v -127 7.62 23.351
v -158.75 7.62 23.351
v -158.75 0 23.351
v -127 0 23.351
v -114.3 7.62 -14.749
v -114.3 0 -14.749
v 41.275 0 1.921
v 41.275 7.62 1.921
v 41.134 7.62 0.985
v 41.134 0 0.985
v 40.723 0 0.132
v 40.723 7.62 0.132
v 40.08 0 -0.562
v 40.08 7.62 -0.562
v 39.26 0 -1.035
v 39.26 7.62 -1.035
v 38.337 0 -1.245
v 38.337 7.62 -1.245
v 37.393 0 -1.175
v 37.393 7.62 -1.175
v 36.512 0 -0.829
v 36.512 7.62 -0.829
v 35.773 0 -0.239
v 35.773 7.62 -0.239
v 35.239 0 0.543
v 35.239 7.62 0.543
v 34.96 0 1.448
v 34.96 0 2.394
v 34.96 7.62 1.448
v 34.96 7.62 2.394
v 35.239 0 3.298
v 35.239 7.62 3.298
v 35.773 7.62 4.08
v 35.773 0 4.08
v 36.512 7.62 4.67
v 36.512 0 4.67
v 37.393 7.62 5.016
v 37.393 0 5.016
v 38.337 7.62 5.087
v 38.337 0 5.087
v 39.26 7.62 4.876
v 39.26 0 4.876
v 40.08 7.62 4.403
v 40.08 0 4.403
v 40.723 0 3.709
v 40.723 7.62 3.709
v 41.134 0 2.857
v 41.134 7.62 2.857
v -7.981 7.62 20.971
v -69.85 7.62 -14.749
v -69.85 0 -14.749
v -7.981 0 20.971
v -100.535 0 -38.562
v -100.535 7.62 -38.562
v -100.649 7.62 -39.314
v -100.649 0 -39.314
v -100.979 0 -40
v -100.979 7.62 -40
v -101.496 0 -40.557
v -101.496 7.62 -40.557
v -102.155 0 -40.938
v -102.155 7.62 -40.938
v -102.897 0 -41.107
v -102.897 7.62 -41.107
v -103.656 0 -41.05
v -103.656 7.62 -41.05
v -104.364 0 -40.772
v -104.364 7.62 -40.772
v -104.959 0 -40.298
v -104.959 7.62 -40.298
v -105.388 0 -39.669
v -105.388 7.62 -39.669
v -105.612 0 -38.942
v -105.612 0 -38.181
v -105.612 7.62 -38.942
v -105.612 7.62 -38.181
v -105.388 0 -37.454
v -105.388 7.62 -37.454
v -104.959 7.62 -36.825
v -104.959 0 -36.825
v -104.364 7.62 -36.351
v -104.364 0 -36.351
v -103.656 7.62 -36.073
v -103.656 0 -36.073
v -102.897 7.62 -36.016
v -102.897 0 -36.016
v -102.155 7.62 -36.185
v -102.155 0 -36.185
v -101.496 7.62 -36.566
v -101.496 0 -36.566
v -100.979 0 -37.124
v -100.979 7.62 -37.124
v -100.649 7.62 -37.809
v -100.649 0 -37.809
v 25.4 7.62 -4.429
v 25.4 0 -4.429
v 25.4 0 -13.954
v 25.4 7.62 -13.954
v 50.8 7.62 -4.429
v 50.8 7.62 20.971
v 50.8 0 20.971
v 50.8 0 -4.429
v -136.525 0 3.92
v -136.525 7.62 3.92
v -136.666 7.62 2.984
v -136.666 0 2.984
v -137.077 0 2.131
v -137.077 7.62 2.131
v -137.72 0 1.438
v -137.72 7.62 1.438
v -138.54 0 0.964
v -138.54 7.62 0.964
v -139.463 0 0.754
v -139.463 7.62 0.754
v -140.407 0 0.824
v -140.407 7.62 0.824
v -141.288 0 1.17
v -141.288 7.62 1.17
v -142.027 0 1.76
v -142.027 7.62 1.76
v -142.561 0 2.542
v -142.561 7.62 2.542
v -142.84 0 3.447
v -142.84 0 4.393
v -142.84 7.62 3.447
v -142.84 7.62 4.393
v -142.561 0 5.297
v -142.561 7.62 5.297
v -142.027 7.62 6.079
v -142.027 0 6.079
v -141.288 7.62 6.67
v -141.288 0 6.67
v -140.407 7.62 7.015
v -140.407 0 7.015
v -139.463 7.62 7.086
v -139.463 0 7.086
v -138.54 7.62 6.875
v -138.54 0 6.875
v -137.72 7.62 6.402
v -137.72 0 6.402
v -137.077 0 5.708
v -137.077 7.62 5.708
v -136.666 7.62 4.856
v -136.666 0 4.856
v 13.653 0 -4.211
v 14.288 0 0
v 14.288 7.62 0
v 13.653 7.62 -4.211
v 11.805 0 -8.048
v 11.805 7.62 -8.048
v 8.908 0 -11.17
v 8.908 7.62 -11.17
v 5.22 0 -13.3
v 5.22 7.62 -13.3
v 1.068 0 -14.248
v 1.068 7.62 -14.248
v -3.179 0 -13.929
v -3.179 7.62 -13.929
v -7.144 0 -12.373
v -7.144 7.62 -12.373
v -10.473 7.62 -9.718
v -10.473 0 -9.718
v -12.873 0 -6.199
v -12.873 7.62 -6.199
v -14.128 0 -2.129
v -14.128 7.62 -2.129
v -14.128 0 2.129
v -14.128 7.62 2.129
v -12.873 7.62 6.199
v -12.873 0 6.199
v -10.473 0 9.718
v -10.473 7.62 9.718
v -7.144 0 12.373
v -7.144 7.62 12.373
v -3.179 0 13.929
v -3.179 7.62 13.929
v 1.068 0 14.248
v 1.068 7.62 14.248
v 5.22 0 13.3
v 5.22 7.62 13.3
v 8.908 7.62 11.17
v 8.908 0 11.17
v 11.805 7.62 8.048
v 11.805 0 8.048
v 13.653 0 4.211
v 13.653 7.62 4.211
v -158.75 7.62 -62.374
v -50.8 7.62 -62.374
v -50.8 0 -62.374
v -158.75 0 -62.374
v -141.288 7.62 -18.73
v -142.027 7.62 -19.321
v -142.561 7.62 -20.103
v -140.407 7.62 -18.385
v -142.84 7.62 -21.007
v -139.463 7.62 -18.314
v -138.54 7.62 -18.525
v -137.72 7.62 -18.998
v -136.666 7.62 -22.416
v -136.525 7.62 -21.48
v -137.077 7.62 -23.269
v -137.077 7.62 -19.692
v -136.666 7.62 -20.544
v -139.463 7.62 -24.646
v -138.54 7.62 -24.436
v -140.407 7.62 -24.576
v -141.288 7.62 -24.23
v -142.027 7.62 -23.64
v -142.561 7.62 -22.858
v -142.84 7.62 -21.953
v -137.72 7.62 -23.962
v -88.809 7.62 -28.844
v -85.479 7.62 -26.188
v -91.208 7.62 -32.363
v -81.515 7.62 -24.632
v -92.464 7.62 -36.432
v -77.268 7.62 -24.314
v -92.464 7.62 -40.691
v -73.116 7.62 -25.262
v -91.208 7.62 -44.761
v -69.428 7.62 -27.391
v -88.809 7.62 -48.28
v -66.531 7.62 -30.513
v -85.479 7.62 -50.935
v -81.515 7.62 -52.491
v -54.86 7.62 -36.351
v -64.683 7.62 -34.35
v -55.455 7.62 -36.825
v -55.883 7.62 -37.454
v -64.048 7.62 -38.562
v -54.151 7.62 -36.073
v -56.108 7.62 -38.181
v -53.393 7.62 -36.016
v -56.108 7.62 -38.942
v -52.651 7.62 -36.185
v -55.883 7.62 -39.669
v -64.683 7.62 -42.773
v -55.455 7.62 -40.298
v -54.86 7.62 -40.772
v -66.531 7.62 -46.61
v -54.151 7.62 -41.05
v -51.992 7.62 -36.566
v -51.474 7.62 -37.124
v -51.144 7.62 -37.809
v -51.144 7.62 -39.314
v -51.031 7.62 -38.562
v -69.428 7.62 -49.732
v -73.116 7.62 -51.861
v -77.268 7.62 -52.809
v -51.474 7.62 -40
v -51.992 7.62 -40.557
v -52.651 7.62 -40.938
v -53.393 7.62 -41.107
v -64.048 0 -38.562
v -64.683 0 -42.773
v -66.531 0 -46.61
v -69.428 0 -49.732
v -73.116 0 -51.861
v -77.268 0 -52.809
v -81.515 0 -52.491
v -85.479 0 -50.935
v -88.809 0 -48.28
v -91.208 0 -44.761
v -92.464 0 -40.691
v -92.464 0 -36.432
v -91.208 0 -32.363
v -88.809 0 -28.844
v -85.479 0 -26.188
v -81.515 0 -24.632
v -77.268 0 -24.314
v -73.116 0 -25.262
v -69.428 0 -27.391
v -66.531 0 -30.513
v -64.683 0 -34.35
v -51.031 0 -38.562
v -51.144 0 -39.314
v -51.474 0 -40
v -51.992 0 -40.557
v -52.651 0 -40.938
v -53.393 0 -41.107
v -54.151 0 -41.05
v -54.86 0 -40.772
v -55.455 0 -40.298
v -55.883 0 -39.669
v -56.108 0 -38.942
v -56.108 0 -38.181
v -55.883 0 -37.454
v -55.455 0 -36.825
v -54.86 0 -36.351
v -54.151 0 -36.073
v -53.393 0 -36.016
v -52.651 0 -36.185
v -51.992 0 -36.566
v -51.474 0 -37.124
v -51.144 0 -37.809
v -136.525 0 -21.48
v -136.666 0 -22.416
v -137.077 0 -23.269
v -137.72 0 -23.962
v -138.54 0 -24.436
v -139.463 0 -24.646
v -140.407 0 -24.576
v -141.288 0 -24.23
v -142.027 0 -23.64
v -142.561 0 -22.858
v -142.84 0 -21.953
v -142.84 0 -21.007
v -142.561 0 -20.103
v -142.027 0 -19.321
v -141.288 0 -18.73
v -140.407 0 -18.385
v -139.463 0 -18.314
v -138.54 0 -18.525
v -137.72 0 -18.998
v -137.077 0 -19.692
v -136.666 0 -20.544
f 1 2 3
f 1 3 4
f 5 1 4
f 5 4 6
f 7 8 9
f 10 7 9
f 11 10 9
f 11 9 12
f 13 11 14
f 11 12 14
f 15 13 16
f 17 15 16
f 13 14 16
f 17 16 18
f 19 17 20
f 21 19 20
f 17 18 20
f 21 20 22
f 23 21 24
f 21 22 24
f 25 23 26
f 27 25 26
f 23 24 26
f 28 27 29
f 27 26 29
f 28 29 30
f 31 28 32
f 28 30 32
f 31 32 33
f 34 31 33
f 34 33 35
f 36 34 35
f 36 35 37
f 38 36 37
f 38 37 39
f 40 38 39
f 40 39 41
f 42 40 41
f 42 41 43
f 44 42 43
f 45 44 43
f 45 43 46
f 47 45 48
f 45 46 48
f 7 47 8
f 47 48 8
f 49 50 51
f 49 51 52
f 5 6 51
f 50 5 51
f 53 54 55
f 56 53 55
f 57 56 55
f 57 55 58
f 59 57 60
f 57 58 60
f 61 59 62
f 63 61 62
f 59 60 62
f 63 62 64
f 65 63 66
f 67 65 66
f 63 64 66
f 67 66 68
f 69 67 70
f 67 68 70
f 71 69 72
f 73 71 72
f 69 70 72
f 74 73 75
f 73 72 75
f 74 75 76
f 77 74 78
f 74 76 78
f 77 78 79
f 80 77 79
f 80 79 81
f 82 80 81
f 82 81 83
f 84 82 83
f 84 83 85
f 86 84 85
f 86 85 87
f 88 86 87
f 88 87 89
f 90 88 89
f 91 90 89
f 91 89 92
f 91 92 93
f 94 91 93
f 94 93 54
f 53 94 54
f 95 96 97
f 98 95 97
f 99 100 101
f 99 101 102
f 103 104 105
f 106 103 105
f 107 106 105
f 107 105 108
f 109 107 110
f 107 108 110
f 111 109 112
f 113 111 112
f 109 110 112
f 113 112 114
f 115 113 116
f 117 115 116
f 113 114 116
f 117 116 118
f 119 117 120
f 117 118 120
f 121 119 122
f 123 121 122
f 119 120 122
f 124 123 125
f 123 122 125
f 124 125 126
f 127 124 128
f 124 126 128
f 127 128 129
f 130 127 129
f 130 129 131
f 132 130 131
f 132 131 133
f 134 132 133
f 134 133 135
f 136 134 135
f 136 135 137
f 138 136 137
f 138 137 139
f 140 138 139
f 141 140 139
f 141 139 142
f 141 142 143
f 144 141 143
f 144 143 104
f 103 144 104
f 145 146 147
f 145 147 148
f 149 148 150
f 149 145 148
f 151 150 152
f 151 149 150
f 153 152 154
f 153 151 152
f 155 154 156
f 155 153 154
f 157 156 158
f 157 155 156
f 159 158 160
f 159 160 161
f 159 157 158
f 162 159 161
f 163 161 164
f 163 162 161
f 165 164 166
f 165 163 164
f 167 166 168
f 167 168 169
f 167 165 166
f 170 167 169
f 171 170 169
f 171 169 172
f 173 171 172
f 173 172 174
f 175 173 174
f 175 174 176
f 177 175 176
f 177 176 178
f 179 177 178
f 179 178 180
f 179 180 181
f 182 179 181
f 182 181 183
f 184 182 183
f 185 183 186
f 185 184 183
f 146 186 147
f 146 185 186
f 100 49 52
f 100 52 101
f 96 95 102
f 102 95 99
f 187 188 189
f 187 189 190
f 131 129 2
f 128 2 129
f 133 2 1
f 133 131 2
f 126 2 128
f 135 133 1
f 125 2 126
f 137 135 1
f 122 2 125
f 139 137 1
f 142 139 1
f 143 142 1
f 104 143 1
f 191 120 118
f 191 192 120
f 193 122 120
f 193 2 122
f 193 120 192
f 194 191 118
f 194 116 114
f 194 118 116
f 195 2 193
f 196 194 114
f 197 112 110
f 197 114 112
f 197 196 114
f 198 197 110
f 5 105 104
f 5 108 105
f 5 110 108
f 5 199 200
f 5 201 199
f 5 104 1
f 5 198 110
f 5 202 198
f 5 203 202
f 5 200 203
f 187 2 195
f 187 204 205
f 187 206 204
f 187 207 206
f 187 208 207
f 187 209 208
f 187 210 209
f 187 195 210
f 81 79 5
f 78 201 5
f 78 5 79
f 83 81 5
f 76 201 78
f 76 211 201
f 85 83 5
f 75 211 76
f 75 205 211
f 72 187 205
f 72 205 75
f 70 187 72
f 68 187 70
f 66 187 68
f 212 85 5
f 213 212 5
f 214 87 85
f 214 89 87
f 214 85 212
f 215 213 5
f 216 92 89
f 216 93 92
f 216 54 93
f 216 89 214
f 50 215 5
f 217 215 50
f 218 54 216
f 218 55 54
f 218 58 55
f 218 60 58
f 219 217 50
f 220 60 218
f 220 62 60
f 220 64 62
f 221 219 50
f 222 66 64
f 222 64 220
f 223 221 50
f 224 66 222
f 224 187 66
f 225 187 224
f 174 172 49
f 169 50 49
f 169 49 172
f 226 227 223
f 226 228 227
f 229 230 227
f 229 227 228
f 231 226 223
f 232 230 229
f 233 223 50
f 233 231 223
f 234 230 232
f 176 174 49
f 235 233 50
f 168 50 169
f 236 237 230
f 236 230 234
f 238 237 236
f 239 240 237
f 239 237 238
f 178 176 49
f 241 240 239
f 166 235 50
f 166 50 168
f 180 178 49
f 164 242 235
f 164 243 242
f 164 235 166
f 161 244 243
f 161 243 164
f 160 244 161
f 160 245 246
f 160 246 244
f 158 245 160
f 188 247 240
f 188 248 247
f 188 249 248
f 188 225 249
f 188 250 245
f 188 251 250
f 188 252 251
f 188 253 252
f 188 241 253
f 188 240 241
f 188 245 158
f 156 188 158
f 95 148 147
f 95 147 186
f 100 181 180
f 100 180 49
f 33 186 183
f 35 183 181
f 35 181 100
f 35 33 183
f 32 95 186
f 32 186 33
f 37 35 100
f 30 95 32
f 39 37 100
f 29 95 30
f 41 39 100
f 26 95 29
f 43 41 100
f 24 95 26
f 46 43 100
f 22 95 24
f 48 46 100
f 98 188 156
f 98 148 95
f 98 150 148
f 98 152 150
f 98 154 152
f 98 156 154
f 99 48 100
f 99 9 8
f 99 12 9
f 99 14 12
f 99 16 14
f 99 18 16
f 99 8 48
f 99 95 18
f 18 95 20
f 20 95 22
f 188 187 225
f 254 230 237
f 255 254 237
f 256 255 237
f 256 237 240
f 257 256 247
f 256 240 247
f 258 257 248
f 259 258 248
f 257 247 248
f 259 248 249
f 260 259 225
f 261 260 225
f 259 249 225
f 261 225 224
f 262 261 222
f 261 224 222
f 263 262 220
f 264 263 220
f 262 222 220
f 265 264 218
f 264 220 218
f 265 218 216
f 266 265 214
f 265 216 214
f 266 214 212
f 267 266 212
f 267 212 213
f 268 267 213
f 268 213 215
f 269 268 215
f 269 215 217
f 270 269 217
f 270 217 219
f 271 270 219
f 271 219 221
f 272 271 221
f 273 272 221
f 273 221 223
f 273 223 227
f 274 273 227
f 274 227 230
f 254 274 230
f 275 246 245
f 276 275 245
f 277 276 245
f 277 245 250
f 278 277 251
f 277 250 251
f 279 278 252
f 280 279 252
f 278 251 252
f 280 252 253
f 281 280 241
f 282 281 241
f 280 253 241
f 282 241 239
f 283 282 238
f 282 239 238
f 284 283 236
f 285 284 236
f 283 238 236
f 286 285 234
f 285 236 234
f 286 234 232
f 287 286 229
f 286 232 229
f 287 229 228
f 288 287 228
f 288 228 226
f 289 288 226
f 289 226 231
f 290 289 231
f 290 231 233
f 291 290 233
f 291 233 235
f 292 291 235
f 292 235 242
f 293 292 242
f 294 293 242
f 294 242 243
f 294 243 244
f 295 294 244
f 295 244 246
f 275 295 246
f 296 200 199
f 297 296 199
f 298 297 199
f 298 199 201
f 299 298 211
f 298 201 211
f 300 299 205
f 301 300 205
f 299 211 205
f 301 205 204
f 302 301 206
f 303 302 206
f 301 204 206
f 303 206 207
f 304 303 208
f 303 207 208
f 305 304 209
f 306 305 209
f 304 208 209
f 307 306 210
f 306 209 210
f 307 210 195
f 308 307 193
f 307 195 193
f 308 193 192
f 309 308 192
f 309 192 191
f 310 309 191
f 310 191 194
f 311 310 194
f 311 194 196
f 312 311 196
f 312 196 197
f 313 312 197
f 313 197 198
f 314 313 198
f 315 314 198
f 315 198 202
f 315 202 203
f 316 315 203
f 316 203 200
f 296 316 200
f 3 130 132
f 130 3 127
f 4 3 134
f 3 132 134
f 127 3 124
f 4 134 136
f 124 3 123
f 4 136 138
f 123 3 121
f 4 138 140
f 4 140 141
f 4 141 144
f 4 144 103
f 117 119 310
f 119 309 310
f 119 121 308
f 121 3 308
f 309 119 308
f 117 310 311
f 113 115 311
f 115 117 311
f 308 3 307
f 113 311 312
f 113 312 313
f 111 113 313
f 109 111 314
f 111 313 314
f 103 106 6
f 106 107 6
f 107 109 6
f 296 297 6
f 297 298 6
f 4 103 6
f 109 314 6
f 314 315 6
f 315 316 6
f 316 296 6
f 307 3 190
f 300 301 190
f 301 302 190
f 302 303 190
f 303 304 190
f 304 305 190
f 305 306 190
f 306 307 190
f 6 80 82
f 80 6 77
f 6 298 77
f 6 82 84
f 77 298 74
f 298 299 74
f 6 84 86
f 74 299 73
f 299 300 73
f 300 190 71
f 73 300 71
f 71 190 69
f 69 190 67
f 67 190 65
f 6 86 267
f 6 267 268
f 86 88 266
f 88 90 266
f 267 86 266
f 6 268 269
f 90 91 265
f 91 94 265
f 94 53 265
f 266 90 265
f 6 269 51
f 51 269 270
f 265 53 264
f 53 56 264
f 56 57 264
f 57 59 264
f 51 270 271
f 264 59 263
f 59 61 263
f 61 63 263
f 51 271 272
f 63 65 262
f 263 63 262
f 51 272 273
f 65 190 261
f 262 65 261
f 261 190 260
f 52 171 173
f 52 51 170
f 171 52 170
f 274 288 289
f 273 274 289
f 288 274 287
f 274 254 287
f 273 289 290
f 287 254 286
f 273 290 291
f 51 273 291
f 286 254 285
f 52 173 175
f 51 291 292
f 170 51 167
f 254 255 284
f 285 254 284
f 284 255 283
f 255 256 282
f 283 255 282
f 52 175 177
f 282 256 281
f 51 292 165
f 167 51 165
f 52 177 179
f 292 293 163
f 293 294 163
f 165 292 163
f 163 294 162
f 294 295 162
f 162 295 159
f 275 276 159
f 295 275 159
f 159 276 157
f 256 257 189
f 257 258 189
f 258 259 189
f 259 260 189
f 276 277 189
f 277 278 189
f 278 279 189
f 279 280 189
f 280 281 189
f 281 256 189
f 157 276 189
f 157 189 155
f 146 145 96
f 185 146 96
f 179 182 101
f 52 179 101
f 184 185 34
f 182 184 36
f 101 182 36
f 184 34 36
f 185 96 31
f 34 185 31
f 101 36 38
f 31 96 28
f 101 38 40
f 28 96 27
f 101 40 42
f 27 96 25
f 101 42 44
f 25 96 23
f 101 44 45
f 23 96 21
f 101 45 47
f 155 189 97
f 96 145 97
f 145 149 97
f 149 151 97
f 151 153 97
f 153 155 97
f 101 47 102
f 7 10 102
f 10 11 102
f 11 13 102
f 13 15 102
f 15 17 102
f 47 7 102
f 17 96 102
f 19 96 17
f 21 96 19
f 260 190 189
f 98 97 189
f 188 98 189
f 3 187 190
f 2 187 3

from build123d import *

# Parameters (mm, degrees)
SKETCH1_R           = 14.2875
BOSS_EXTRUDE1_DEPTH = 7.62
SKETCH2_R           = 14.2875
SKETCH2_R_2         = 2.5527
CUT_EXTRUDE1_DEPTH  = 8.62
SKETCH5_W           = 25.4
SKETCH5_H           = 25.4
SKETCH5_R           = 3.175
BOSS_EXTRUDE3_DEPTH = 7.62
BOSS_EXTRUDE4_DEPTH = 7.62
SKETCH7_R           = 3.175
CUT_EXTRUDE2_DEPTH  = 8.62
CUT_EXTRUDE3_DEPTH  = 7.62


with BuildPart() as part:
    # Sketch1 → Boss-Extrude1 (new body)
    with BuildSketch(Plane(origin=(0, 0, 0), x_dir=(1, 0, 0), z_dir=(0, 1, 0))):
        Polygon((-76.2, 14.749121283), (-14.331263069, -20.970810639), (25.4, -20.970810639), (25.4, 13.954189361), (-50.8, 62.374121283), (-152.4, 62.374121283), (-152.4, 14.749121283), align=None)
        Circle(SKETCH1_R, mode=Mode.SUBTRACT)
    extrude(amount=BOSS_EXTRUDE1_DEPTH)

    # Sketch2 → Cut-Extrude1 (cut, through all)
    with BuildSketch(Plane(origin=(0, 7.62, 0), x_dir=(1, 0, 0), z_dir=(0, 1, 0))):
        with Locations((-78.335649741, 38.561621283)):
            Circle(SKETCH2_R)
        with Locations((-103.087949741, 38.561621283)):
            Circle(SKETCH2_R_2)
        with Locations((-53.583349741, 38.561621283)):
            Circle(SKETCH2_R_2)
    extrude(amount=-CUT_EXTRUDE1_DEPTH, mode=Mode.SUBTRACT)

    # Sketch5 → Boss-Extrude3 (add)
    with BuildSketch(Plane(origin=(0, 7.62, 0), x_dir=(1, 0, 0), z_dir=(0, 1, 0))):
        with Locations((38.1, -8.270810639)):
            Rectangle(SKETCH5_W, SKETCH5_H)
        with Locations((38.1, -1.920810639)):
            Circle(SKETCH5_R, mode=Mode.SUBTRACT)
    extrude(amount=-BOSS_EXTRUDE3_DEPTH)

    # Sketch6 → Boss-Extrude4 (add)
    with BuildSketch(Plane(origin=(0, 7.62, 0), x_dir=(1, 0, 0), z_dir=(0, 1, 0))):
        Polygon((-152.4, -23.350878717), (-127, -23.350878717), (-114.3, 14.749121283), (-152.4, 14.749121283), (-152.4, 62.374121283), (-158.75, 62.374121283), (-158.75, -23.350878717), align=None)
    extrude(amount=-BOSS_EXTRUDE4_DEPTH)

    # Sketch7 → Cut-Extrude2 (cut, through all)
    with BuildSketch(Plane(origin=(0, 7.62, 0), x_dir=(1, 0, 0), z_dir=(0, 1, 0))):
        with Locations((-139.7, 21.480121283)):
            Circle(SKETCH7_R)
        with Locations((-139.7, -3.919878717)):
            Circle(SKETCH7_R)
    extrude(amount=-CUT_EXTRUDE2_DEPTH, mode=Mode.SUBTRACT)

    # Sketch10 → Cut-Extrude3 (cut)
    with BuildSketch(Plane(origin=(0, 7.62, 0), x_dir=(1, 0, 0), z_dir=(0, 1, 0))):
        Polygon((-76.2, 14.749121283), (-69.85, 14.749121283), (-7.981263069, -20.970810639), (-14.331263069, -20.970810639), align=None)
    extrude(amount=-CUT_EXTRUDE3_DEPTH, mode=Mode.SUBTRACT)


solid = part.part
